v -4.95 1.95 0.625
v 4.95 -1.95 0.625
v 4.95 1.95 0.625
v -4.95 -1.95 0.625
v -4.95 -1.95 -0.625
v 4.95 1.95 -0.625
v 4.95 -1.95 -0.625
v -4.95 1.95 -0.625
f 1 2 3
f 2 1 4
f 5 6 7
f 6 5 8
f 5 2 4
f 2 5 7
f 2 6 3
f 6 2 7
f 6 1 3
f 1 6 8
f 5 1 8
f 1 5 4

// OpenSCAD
$fn = 64;

size = [9.90, 3.90, 1.25];

cube(size, center=true);
